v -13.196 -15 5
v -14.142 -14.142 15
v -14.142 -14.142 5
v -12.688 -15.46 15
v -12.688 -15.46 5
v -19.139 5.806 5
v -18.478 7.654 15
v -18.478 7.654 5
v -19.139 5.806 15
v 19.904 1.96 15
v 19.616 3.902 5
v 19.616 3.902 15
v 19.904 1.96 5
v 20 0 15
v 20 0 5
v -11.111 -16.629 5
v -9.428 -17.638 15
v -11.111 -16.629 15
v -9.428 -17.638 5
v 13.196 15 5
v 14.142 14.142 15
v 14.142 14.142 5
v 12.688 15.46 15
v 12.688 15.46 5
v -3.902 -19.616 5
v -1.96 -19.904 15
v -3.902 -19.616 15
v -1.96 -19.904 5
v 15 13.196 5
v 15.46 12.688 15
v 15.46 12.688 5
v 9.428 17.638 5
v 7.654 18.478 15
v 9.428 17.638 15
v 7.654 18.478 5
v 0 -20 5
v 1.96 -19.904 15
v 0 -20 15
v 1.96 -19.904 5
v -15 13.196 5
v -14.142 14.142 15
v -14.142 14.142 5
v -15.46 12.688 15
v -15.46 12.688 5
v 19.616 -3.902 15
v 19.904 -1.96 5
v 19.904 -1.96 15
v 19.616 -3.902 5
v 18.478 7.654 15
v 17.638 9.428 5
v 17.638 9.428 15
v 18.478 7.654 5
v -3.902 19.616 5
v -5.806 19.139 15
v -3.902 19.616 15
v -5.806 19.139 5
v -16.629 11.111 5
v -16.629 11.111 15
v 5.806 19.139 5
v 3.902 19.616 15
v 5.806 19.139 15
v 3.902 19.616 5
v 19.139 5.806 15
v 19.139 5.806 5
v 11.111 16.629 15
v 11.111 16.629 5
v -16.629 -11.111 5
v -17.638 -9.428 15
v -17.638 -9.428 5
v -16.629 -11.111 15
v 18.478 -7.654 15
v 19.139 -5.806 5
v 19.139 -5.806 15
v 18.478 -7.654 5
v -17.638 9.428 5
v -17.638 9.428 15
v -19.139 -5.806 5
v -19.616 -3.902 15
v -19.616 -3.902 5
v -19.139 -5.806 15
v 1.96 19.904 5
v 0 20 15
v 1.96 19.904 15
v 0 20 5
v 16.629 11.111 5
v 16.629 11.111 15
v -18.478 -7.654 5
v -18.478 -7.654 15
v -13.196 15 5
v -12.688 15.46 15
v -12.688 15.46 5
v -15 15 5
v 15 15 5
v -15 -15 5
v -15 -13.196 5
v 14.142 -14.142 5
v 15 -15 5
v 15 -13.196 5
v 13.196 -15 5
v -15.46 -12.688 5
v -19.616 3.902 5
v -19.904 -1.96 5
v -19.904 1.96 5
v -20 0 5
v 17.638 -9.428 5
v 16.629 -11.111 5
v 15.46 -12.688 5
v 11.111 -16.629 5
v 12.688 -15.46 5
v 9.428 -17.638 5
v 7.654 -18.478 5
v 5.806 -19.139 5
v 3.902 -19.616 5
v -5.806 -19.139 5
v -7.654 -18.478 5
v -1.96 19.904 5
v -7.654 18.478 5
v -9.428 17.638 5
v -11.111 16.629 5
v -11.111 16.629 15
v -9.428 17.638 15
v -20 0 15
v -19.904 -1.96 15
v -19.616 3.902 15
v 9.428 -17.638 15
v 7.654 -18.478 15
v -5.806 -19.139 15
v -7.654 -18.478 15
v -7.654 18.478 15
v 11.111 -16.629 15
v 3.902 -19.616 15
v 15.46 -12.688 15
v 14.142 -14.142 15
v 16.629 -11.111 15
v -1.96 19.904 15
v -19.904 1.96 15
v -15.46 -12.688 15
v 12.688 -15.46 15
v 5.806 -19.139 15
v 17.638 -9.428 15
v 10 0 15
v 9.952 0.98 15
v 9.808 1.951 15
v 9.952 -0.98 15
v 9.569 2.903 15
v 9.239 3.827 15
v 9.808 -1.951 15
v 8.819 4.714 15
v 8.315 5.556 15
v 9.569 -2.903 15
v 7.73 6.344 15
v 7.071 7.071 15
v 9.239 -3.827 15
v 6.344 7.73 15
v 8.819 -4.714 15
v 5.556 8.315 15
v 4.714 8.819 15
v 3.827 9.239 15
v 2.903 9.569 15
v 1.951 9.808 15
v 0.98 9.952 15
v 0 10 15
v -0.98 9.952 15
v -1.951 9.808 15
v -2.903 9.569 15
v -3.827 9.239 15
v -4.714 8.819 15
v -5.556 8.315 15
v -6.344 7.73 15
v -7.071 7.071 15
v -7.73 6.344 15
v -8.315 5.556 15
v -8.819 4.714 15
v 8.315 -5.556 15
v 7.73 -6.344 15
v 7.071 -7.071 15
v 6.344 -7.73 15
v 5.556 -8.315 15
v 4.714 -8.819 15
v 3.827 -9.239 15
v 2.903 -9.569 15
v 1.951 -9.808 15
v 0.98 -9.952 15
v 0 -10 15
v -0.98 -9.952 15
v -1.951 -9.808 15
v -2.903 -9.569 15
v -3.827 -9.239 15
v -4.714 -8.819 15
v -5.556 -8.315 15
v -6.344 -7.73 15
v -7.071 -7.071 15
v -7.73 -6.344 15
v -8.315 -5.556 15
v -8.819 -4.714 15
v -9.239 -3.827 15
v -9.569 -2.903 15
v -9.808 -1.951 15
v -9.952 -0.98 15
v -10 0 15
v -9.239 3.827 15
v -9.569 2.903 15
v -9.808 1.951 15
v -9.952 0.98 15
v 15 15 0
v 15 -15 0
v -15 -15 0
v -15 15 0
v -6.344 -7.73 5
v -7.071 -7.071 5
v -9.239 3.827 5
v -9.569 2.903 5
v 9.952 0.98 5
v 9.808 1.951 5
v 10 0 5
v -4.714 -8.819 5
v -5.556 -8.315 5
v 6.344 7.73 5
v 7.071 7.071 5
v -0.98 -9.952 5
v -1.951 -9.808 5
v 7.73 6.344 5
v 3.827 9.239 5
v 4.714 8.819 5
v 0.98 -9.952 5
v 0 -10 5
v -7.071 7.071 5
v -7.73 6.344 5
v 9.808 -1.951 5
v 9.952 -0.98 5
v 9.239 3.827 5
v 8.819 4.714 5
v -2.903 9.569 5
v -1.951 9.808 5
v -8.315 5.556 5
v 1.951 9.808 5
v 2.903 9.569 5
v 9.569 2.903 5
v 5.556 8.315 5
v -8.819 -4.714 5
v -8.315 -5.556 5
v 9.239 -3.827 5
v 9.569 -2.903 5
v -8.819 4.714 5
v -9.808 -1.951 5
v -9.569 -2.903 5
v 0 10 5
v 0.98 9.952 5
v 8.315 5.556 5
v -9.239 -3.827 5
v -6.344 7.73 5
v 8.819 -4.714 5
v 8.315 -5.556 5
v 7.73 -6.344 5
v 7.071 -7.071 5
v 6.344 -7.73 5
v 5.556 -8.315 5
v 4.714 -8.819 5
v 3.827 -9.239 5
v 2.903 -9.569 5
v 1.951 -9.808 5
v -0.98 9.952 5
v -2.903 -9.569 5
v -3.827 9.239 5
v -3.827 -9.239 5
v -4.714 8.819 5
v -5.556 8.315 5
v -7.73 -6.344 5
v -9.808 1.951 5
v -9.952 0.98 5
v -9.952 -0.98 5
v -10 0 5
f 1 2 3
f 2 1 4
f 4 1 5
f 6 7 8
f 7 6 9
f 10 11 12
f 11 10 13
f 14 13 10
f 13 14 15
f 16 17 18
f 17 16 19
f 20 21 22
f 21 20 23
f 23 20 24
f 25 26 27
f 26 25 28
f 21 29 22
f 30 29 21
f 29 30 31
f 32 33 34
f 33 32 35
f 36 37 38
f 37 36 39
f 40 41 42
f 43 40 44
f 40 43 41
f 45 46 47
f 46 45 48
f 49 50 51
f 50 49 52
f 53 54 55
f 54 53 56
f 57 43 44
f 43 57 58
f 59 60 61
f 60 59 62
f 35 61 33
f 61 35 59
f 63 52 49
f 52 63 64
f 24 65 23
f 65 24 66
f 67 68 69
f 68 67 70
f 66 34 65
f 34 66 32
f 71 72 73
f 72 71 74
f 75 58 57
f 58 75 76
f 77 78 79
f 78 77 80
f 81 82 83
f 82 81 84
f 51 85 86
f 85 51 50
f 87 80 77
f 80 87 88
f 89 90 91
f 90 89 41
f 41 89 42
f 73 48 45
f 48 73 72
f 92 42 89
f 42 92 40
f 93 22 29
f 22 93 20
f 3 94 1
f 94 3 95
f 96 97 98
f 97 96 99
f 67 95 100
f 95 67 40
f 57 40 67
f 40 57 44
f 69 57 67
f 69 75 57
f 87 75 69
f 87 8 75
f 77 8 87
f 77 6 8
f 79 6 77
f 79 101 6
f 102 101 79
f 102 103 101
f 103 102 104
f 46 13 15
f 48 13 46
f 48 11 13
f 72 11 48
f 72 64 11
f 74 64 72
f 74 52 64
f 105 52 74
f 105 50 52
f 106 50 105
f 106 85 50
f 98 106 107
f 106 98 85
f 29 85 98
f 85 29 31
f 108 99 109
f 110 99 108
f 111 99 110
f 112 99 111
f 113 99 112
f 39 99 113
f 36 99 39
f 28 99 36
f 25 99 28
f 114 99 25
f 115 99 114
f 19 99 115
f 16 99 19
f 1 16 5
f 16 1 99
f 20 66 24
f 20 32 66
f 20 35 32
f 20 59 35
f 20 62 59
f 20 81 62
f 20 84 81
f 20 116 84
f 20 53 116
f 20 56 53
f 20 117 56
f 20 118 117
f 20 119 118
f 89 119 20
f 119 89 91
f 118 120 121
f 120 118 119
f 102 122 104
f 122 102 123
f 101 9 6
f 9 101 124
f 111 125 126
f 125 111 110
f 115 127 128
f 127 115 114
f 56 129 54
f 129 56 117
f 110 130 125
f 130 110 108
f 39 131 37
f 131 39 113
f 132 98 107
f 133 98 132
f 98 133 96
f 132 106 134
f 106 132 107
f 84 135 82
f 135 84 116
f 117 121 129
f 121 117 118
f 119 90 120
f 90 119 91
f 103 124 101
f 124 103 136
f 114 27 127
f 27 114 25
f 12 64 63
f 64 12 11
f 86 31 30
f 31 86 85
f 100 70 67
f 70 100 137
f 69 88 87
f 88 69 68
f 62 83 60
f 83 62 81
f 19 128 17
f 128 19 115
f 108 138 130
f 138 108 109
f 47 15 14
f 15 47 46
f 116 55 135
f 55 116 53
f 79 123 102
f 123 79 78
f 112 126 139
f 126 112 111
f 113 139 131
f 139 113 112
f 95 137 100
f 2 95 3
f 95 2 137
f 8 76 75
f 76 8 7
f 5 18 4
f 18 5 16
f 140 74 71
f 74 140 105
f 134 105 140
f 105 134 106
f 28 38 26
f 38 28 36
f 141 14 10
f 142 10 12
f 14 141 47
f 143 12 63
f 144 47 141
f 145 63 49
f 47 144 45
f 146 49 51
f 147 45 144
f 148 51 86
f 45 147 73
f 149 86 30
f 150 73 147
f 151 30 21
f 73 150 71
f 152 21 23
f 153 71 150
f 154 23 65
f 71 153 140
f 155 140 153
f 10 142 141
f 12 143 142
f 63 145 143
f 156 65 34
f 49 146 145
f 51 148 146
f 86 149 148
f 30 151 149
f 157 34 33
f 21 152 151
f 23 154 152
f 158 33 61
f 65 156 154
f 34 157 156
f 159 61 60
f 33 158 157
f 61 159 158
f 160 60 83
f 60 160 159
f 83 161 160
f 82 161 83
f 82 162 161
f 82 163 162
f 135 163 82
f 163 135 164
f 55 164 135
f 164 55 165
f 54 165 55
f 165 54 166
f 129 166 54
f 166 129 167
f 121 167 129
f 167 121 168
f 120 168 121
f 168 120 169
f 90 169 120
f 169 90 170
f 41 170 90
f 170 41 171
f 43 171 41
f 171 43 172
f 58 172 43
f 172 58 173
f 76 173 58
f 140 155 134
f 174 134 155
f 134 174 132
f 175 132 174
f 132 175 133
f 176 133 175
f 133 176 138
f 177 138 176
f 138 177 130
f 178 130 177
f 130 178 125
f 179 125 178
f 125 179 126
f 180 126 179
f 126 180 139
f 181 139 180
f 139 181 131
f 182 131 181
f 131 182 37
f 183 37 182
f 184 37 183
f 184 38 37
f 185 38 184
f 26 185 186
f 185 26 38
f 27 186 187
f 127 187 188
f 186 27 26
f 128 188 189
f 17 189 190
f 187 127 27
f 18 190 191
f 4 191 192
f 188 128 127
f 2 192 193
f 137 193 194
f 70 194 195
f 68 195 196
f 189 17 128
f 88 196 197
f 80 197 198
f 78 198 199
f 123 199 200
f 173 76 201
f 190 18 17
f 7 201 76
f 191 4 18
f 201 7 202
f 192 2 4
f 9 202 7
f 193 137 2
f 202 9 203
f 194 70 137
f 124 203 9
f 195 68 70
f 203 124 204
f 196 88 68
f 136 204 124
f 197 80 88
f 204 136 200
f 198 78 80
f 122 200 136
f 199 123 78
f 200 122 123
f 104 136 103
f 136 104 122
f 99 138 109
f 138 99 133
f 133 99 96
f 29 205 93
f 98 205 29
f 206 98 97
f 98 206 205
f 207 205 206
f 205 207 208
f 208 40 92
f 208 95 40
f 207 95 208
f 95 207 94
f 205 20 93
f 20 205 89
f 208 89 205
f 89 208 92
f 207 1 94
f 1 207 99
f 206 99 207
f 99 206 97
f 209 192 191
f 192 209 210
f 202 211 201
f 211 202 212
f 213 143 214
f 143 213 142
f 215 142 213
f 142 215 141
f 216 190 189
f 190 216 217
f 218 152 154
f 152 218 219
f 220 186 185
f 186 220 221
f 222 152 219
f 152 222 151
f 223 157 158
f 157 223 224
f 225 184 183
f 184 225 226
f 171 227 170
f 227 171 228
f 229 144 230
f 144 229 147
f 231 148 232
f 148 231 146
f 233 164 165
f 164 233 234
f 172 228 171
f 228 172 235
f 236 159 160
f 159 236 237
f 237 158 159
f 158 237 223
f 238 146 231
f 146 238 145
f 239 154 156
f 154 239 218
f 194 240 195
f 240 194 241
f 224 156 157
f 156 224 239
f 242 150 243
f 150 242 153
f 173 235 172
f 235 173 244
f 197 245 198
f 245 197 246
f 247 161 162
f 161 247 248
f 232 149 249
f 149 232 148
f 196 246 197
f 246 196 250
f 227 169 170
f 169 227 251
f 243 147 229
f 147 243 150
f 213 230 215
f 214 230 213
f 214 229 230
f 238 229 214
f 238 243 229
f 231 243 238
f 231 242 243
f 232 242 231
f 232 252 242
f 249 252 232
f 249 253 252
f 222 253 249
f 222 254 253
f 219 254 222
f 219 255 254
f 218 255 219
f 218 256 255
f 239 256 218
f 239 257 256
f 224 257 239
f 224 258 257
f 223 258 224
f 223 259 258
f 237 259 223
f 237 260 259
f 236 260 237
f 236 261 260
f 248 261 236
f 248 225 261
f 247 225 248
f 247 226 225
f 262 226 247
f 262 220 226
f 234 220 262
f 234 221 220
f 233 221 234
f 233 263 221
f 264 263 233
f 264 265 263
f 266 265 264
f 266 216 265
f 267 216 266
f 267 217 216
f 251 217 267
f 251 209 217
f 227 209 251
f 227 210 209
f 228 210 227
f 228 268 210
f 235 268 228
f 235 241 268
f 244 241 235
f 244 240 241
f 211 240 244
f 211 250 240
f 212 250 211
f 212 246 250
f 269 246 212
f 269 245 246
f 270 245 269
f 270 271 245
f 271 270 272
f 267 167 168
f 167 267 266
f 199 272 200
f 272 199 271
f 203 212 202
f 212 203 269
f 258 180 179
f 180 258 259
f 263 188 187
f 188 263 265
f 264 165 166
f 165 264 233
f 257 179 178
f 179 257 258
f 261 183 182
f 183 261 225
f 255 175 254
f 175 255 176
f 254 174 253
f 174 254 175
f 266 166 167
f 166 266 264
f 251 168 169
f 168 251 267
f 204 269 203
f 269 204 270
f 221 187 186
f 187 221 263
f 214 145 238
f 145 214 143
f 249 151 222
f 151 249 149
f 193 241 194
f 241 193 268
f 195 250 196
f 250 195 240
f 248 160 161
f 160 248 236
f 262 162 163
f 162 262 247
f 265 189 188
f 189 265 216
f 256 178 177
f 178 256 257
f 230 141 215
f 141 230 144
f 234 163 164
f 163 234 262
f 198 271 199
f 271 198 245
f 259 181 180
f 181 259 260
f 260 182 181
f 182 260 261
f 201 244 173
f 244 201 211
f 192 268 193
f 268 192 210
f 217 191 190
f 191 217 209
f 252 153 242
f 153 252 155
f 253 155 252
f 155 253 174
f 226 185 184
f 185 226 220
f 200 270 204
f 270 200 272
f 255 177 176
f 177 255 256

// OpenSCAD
module component() {
    difference() {
        union() {
            translate([0, 0, 5])
                cylinder(h=10, r=20, $fn=64);
            translate([-15, -15, 0])
                cube([30, 30, 5]);
        }
        translate([0, 0, 5])
            cylinder(h=10, r=10, $fn=64);
    }
}

component();
